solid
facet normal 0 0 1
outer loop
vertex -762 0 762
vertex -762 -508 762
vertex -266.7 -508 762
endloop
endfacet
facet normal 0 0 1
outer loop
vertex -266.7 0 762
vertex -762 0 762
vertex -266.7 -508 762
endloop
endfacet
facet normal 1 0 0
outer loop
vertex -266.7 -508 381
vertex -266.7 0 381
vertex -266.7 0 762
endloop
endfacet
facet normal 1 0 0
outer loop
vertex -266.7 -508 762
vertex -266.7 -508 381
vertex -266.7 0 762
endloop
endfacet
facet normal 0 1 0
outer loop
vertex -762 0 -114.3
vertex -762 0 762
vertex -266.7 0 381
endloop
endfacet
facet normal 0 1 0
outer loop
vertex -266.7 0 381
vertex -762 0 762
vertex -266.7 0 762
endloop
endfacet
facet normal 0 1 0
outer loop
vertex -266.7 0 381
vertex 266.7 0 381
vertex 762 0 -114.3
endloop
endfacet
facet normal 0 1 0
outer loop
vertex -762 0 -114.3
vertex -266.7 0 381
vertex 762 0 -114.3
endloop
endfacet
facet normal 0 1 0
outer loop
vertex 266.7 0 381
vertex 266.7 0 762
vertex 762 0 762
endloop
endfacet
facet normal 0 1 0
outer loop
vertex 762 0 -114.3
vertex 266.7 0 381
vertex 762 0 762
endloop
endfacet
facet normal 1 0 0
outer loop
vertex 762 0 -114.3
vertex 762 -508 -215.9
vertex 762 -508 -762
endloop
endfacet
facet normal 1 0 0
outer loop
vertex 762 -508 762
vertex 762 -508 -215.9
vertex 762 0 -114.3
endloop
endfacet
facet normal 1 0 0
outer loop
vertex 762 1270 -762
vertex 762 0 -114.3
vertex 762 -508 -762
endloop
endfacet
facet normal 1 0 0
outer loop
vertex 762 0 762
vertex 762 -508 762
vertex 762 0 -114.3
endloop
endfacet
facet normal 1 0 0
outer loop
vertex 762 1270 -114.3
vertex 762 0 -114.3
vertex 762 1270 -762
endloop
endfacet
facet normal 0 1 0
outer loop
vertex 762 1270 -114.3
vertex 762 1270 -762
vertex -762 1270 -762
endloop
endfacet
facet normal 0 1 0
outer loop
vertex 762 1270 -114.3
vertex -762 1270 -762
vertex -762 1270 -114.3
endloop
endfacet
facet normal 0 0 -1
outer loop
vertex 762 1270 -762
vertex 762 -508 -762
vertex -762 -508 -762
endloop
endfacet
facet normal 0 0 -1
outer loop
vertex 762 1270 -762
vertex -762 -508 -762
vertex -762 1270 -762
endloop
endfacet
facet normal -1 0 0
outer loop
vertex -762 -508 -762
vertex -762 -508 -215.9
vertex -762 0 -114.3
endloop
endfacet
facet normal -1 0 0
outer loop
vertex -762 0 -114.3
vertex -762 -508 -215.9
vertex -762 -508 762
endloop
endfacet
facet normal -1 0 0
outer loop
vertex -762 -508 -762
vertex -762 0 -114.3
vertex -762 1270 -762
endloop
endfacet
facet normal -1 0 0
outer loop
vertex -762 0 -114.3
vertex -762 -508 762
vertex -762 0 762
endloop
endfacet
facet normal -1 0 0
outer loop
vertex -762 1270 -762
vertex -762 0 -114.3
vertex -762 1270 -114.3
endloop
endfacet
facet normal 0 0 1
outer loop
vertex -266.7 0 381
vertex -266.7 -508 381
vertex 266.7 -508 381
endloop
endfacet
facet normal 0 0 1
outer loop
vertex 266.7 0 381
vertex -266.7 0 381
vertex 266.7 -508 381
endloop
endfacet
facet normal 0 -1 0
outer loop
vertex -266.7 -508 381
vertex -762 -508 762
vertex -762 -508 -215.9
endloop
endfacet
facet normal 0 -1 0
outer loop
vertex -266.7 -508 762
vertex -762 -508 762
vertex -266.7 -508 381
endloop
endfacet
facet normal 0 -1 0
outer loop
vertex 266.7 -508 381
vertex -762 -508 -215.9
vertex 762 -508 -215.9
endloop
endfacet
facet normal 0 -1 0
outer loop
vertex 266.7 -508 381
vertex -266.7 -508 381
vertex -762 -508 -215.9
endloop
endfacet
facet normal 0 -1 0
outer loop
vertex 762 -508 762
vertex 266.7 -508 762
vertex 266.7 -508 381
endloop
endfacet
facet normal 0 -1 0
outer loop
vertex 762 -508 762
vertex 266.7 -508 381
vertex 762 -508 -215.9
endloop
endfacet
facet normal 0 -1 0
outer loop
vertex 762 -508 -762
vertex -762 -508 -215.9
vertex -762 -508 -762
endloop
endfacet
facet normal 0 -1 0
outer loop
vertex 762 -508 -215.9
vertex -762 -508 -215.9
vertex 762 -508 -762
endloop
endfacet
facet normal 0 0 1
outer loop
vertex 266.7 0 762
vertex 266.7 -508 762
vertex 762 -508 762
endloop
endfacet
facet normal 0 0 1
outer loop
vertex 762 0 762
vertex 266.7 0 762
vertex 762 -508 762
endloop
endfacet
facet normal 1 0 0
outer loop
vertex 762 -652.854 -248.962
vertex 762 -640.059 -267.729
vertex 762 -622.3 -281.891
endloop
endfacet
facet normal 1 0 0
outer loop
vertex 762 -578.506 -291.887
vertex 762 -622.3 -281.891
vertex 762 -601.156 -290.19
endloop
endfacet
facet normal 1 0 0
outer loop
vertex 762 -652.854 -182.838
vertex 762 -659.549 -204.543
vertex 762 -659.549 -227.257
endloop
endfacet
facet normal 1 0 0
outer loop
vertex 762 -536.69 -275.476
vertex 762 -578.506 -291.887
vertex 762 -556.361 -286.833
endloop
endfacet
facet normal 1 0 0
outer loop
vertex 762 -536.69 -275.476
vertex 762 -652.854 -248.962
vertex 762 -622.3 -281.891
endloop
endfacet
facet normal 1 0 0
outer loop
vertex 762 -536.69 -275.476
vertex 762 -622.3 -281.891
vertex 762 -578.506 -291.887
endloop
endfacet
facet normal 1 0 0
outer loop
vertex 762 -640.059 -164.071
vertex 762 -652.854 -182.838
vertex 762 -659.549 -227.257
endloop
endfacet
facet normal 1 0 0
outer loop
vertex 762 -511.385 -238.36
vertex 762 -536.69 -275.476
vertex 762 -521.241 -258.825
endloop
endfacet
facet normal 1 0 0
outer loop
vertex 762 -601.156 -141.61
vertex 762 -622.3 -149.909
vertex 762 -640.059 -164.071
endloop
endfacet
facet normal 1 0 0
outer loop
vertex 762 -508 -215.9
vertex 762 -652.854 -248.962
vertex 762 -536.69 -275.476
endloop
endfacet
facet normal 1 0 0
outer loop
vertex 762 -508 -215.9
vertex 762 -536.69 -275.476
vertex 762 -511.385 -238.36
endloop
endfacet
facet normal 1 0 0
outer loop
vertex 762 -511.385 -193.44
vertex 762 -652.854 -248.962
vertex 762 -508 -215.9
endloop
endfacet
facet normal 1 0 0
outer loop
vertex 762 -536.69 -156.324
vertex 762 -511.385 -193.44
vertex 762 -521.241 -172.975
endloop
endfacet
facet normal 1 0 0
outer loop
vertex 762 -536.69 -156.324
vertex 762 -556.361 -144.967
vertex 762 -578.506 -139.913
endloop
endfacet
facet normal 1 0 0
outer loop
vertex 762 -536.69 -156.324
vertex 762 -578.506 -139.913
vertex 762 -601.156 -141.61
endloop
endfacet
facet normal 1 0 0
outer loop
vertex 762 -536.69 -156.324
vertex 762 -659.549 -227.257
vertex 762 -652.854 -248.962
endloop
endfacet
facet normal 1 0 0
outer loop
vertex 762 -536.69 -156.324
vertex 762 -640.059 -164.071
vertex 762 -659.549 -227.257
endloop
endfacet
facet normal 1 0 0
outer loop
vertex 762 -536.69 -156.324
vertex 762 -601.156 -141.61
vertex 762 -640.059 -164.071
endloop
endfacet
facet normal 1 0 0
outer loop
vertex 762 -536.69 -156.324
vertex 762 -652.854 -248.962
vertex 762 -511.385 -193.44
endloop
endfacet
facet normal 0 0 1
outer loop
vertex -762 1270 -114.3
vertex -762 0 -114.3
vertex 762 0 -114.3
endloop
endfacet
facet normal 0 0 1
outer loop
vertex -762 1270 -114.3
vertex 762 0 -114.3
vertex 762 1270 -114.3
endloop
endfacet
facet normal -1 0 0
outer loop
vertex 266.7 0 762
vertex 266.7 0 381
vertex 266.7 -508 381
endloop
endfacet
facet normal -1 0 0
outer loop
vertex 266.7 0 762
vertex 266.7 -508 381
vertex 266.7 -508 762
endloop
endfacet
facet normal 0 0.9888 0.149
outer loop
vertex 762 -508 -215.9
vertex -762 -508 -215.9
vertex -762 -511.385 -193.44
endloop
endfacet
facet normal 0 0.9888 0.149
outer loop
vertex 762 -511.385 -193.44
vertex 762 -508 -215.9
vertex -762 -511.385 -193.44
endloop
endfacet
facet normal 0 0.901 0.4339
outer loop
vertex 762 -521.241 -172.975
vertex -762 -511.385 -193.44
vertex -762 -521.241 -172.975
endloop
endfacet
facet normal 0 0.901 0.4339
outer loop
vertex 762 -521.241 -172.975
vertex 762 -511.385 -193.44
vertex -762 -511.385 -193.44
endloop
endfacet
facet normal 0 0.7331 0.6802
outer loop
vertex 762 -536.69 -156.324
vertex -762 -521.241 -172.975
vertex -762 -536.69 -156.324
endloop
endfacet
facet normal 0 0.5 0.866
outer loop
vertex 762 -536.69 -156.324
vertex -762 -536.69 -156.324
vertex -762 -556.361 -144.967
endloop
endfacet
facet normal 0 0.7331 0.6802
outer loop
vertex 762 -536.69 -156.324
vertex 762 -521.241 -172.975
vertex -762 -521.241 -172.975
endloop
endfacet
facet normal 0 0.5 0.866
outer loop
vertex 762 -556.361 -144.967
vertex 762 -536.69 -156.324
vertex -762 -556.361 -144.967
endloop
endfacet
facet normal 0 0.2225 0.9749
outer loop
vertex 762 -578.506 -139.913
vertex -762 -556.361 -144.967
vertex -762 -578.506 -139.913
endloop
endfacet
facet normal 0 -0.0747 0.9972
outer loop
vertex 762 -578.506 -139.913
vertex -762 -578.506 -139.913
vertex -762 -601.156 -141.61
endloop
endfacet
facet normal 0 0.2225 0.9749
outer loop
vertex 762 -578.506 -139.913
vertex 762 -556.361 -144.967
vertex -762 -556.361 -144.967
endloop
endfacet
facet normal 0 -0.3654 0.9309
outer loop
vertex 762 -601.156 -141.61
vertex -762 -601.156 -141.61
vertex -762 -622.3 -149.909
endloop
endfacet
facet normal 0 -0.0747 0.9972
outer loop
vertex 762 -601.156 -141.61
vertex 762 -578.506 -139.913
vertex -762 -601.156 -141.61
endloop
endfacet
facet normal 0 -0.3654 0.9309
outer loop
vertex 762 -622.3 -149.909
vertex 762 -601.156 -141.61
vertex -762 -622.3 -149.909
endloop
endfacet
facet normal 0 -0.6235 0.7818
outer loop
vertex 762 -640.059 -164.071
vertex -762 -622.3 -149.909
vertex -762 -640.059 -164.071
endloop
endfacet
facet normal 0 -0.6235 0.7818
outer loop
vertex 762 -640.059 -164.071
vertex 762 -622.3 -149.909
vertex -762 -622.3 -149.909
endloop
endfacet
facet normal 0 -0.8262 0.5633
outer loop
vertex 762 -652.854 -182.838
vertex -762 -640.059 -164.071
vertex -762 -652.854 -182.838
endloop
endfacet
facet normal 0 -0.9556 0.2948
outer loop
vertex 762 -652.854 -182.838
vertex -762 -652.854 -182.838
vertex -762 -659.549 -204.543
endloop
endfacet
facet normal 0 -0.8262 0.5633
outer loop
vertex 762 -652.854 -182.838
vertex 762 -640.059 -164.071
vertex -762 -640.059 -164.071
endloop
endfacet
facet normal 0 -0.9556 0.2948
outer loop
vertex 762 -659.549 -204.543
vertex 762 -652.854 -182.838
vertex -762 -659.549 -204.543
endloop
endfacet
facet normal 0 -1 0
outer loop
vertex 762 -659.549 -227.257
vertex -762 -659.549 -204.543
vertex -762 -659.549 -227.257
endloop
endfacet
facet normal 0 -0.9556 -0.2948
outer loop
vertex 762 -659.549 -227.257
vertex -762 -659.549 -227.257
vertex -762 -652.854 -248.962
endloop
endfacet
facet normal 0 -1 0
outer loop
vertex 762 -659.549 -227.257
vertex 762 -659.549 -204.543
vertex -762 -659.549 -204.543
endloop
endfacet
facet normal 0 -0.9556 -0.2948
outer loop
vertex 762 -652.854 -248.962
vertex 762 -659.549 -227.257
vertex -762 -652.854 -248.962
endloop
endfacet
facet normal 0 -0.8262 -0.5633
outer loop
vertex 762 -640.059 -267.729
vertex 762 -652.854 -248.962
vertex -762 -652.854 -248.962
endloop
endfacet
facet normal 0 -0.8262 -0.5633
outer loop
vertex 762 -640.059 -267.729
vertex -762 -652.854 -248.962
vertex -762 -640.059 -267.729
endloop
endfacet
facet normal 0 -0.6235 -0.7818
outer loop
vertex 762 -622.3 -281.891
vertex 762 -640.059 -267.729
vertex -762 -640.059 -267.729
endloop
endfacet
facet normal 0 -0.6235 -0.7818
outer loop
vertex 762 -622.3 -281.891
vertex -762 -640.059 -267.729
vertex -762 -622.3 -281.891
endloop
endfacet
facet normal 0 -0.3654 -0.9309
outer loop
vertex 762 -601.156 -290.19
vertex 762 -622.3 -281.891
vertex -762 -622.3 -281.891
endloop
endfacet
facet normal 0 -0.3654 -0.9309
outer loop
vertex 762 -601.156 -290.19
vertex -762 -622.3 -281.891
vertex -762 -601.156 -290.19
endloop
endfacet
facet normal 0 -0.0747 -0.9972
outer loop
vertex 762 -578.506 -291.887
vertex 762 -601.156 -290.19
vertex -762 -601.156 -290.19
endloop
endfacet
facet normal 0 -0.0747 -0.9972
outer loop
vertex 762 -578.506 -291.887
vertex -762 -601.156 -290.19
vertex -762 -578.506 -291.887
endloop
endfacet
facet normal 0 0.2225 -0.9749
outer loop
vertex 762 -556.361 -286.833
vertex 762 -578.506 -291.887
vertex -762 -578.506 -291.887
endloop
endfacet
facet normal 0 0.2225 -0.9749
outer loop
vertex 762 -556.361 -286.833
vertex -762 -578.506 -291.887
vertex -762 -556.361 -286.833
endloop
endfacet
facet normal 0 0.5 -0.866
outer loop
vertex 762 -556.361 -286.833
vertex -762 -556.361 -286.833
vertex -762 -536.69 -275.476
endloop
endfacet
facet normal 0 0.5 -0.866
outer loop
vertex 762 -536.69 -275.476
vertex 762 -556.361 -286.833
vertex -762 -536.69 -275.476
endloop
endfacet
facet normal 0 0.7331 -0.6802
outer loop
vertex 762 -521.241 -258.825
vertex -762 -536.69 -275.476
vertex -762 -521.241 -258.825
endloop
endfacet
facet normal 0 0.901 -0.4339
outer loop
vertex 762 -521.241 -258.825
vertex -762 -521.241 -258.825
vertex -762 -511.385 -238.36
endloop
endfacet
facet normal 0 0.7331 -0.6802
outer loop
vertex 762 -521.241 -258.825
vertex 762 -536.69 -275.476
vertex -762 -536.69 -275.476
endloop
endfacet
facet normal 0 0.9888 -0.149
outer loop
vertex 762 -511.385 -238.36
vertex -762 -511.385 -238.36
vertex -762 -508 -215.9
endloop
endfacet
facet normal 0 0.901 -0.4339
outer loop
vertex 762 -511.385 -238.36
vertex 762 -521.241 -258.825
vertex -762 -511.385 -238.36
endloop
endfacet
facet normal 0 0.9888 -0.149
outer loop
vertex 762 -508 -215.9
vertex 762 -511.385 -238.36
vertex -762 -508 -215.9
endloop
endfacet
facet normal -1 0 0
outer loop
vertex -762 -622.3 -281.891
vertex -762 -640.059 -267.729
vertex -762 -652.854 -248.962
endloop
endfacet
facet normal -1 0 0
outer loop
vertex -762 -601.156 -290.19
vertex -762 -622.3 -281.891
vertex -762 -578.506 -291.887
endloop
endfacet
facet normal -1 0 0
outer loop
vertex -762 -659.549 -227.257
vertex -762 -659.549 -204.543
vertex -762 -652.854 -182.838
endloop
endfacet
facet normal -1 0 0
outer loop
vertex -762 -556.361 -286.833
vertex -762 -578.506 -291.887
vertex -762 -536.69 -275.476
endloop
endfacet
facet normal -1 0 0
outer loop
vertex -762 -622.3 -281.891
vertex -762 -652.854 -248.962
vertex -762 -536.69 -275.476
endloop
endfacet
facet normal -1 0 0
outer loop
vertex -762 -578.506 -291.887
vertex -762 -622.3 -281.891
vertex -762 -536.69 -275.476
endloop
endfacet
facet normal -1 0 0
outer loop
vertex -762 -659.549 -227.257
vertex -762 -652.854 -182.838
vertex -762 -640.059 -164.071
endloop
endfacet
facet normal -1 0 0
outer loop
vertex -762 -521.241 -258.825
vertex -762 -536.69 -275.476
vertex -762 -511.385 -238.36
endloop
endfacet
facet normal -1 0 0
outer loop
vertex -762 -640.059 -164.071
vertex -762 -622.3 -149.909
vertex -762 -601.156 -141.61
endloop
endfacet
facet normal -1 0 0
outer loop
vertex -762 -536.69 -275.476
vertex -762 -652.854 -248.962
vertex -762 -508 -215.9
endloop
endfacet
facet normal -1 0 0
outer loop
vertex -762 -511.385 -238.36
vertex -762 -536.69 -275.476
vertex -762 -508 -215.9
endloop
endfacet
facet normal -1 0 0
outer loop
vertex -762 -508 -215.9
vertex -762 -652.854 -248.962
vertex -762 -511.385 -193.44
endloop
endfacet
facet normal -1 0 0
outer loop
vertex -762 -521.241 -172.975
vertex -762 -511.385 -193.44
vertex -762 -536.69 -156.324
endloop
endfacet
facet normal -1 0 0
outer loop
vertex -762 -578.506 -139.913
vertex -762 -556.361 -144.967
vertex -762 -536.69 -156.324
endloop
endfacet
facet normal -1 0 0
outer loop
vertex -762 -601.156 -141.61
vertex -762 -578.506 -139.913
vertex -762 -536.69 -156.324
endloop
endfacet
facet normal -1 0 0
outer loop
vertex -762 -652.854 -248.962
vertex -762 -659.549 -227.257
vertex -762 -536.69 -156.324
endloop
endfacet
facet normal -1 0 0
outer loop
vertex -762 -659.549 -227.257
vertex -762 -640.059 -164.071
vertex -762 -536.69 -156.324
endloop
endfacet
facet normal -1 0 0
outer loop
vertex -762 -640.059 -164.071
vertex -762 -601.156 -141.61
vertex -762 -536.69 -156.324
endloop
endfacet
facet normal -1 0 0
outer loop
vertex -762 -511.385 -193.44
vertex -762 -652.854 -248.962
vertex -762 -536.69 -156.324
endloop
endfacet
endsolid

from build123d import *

# Parameters (mm, degrees)
F0_W     = 1524
F0_H     = 1524
F1_DEPTH = 508
F2_W     = 533.4
F2_H     = 381
F3_DEPTH = 508.001
F4_W     = 1270
F4_H     = 647.7
F5_DEPTH = 1524
F6_R     = 76.2
F7_DEPTH = 1524


with BuildPart() as f1:
    # F0 (on Front) → F1 (new body)
    with BuildSketch(Plane.XZ):
        Rectangle(F0_W, F0_H)
    extrude(amount=F1_DEPTH)

    # F2 (on face) → F3 (cut, through all)
    with BuildSketch(Plane.XZ.offset(508)):
        with Locations((0, 571.5)):
            Rectangle(F2_W, F2_H)
    extrude(amount=-F3_DEPTH, mode=Mode.SUBTRACT)

    # F4 (on face) → F5 (join, through all)
    with BuildSketch(Plane.YZ.offset(762)):
        with Locations((635, -438.15)):
            Rectangle(F4_W, F4_H)
    extrude(amount=-F5_DEPTH)

    # F6 (on face) → F7 (join, through all)
    with BuildSketch(Plane.YZ.offset(762)):
        with Locations((-584.2, -215.9)):
            Circle(F6_R)
    extrude(amount=-F7_DEPTH)


solid = f1.part
